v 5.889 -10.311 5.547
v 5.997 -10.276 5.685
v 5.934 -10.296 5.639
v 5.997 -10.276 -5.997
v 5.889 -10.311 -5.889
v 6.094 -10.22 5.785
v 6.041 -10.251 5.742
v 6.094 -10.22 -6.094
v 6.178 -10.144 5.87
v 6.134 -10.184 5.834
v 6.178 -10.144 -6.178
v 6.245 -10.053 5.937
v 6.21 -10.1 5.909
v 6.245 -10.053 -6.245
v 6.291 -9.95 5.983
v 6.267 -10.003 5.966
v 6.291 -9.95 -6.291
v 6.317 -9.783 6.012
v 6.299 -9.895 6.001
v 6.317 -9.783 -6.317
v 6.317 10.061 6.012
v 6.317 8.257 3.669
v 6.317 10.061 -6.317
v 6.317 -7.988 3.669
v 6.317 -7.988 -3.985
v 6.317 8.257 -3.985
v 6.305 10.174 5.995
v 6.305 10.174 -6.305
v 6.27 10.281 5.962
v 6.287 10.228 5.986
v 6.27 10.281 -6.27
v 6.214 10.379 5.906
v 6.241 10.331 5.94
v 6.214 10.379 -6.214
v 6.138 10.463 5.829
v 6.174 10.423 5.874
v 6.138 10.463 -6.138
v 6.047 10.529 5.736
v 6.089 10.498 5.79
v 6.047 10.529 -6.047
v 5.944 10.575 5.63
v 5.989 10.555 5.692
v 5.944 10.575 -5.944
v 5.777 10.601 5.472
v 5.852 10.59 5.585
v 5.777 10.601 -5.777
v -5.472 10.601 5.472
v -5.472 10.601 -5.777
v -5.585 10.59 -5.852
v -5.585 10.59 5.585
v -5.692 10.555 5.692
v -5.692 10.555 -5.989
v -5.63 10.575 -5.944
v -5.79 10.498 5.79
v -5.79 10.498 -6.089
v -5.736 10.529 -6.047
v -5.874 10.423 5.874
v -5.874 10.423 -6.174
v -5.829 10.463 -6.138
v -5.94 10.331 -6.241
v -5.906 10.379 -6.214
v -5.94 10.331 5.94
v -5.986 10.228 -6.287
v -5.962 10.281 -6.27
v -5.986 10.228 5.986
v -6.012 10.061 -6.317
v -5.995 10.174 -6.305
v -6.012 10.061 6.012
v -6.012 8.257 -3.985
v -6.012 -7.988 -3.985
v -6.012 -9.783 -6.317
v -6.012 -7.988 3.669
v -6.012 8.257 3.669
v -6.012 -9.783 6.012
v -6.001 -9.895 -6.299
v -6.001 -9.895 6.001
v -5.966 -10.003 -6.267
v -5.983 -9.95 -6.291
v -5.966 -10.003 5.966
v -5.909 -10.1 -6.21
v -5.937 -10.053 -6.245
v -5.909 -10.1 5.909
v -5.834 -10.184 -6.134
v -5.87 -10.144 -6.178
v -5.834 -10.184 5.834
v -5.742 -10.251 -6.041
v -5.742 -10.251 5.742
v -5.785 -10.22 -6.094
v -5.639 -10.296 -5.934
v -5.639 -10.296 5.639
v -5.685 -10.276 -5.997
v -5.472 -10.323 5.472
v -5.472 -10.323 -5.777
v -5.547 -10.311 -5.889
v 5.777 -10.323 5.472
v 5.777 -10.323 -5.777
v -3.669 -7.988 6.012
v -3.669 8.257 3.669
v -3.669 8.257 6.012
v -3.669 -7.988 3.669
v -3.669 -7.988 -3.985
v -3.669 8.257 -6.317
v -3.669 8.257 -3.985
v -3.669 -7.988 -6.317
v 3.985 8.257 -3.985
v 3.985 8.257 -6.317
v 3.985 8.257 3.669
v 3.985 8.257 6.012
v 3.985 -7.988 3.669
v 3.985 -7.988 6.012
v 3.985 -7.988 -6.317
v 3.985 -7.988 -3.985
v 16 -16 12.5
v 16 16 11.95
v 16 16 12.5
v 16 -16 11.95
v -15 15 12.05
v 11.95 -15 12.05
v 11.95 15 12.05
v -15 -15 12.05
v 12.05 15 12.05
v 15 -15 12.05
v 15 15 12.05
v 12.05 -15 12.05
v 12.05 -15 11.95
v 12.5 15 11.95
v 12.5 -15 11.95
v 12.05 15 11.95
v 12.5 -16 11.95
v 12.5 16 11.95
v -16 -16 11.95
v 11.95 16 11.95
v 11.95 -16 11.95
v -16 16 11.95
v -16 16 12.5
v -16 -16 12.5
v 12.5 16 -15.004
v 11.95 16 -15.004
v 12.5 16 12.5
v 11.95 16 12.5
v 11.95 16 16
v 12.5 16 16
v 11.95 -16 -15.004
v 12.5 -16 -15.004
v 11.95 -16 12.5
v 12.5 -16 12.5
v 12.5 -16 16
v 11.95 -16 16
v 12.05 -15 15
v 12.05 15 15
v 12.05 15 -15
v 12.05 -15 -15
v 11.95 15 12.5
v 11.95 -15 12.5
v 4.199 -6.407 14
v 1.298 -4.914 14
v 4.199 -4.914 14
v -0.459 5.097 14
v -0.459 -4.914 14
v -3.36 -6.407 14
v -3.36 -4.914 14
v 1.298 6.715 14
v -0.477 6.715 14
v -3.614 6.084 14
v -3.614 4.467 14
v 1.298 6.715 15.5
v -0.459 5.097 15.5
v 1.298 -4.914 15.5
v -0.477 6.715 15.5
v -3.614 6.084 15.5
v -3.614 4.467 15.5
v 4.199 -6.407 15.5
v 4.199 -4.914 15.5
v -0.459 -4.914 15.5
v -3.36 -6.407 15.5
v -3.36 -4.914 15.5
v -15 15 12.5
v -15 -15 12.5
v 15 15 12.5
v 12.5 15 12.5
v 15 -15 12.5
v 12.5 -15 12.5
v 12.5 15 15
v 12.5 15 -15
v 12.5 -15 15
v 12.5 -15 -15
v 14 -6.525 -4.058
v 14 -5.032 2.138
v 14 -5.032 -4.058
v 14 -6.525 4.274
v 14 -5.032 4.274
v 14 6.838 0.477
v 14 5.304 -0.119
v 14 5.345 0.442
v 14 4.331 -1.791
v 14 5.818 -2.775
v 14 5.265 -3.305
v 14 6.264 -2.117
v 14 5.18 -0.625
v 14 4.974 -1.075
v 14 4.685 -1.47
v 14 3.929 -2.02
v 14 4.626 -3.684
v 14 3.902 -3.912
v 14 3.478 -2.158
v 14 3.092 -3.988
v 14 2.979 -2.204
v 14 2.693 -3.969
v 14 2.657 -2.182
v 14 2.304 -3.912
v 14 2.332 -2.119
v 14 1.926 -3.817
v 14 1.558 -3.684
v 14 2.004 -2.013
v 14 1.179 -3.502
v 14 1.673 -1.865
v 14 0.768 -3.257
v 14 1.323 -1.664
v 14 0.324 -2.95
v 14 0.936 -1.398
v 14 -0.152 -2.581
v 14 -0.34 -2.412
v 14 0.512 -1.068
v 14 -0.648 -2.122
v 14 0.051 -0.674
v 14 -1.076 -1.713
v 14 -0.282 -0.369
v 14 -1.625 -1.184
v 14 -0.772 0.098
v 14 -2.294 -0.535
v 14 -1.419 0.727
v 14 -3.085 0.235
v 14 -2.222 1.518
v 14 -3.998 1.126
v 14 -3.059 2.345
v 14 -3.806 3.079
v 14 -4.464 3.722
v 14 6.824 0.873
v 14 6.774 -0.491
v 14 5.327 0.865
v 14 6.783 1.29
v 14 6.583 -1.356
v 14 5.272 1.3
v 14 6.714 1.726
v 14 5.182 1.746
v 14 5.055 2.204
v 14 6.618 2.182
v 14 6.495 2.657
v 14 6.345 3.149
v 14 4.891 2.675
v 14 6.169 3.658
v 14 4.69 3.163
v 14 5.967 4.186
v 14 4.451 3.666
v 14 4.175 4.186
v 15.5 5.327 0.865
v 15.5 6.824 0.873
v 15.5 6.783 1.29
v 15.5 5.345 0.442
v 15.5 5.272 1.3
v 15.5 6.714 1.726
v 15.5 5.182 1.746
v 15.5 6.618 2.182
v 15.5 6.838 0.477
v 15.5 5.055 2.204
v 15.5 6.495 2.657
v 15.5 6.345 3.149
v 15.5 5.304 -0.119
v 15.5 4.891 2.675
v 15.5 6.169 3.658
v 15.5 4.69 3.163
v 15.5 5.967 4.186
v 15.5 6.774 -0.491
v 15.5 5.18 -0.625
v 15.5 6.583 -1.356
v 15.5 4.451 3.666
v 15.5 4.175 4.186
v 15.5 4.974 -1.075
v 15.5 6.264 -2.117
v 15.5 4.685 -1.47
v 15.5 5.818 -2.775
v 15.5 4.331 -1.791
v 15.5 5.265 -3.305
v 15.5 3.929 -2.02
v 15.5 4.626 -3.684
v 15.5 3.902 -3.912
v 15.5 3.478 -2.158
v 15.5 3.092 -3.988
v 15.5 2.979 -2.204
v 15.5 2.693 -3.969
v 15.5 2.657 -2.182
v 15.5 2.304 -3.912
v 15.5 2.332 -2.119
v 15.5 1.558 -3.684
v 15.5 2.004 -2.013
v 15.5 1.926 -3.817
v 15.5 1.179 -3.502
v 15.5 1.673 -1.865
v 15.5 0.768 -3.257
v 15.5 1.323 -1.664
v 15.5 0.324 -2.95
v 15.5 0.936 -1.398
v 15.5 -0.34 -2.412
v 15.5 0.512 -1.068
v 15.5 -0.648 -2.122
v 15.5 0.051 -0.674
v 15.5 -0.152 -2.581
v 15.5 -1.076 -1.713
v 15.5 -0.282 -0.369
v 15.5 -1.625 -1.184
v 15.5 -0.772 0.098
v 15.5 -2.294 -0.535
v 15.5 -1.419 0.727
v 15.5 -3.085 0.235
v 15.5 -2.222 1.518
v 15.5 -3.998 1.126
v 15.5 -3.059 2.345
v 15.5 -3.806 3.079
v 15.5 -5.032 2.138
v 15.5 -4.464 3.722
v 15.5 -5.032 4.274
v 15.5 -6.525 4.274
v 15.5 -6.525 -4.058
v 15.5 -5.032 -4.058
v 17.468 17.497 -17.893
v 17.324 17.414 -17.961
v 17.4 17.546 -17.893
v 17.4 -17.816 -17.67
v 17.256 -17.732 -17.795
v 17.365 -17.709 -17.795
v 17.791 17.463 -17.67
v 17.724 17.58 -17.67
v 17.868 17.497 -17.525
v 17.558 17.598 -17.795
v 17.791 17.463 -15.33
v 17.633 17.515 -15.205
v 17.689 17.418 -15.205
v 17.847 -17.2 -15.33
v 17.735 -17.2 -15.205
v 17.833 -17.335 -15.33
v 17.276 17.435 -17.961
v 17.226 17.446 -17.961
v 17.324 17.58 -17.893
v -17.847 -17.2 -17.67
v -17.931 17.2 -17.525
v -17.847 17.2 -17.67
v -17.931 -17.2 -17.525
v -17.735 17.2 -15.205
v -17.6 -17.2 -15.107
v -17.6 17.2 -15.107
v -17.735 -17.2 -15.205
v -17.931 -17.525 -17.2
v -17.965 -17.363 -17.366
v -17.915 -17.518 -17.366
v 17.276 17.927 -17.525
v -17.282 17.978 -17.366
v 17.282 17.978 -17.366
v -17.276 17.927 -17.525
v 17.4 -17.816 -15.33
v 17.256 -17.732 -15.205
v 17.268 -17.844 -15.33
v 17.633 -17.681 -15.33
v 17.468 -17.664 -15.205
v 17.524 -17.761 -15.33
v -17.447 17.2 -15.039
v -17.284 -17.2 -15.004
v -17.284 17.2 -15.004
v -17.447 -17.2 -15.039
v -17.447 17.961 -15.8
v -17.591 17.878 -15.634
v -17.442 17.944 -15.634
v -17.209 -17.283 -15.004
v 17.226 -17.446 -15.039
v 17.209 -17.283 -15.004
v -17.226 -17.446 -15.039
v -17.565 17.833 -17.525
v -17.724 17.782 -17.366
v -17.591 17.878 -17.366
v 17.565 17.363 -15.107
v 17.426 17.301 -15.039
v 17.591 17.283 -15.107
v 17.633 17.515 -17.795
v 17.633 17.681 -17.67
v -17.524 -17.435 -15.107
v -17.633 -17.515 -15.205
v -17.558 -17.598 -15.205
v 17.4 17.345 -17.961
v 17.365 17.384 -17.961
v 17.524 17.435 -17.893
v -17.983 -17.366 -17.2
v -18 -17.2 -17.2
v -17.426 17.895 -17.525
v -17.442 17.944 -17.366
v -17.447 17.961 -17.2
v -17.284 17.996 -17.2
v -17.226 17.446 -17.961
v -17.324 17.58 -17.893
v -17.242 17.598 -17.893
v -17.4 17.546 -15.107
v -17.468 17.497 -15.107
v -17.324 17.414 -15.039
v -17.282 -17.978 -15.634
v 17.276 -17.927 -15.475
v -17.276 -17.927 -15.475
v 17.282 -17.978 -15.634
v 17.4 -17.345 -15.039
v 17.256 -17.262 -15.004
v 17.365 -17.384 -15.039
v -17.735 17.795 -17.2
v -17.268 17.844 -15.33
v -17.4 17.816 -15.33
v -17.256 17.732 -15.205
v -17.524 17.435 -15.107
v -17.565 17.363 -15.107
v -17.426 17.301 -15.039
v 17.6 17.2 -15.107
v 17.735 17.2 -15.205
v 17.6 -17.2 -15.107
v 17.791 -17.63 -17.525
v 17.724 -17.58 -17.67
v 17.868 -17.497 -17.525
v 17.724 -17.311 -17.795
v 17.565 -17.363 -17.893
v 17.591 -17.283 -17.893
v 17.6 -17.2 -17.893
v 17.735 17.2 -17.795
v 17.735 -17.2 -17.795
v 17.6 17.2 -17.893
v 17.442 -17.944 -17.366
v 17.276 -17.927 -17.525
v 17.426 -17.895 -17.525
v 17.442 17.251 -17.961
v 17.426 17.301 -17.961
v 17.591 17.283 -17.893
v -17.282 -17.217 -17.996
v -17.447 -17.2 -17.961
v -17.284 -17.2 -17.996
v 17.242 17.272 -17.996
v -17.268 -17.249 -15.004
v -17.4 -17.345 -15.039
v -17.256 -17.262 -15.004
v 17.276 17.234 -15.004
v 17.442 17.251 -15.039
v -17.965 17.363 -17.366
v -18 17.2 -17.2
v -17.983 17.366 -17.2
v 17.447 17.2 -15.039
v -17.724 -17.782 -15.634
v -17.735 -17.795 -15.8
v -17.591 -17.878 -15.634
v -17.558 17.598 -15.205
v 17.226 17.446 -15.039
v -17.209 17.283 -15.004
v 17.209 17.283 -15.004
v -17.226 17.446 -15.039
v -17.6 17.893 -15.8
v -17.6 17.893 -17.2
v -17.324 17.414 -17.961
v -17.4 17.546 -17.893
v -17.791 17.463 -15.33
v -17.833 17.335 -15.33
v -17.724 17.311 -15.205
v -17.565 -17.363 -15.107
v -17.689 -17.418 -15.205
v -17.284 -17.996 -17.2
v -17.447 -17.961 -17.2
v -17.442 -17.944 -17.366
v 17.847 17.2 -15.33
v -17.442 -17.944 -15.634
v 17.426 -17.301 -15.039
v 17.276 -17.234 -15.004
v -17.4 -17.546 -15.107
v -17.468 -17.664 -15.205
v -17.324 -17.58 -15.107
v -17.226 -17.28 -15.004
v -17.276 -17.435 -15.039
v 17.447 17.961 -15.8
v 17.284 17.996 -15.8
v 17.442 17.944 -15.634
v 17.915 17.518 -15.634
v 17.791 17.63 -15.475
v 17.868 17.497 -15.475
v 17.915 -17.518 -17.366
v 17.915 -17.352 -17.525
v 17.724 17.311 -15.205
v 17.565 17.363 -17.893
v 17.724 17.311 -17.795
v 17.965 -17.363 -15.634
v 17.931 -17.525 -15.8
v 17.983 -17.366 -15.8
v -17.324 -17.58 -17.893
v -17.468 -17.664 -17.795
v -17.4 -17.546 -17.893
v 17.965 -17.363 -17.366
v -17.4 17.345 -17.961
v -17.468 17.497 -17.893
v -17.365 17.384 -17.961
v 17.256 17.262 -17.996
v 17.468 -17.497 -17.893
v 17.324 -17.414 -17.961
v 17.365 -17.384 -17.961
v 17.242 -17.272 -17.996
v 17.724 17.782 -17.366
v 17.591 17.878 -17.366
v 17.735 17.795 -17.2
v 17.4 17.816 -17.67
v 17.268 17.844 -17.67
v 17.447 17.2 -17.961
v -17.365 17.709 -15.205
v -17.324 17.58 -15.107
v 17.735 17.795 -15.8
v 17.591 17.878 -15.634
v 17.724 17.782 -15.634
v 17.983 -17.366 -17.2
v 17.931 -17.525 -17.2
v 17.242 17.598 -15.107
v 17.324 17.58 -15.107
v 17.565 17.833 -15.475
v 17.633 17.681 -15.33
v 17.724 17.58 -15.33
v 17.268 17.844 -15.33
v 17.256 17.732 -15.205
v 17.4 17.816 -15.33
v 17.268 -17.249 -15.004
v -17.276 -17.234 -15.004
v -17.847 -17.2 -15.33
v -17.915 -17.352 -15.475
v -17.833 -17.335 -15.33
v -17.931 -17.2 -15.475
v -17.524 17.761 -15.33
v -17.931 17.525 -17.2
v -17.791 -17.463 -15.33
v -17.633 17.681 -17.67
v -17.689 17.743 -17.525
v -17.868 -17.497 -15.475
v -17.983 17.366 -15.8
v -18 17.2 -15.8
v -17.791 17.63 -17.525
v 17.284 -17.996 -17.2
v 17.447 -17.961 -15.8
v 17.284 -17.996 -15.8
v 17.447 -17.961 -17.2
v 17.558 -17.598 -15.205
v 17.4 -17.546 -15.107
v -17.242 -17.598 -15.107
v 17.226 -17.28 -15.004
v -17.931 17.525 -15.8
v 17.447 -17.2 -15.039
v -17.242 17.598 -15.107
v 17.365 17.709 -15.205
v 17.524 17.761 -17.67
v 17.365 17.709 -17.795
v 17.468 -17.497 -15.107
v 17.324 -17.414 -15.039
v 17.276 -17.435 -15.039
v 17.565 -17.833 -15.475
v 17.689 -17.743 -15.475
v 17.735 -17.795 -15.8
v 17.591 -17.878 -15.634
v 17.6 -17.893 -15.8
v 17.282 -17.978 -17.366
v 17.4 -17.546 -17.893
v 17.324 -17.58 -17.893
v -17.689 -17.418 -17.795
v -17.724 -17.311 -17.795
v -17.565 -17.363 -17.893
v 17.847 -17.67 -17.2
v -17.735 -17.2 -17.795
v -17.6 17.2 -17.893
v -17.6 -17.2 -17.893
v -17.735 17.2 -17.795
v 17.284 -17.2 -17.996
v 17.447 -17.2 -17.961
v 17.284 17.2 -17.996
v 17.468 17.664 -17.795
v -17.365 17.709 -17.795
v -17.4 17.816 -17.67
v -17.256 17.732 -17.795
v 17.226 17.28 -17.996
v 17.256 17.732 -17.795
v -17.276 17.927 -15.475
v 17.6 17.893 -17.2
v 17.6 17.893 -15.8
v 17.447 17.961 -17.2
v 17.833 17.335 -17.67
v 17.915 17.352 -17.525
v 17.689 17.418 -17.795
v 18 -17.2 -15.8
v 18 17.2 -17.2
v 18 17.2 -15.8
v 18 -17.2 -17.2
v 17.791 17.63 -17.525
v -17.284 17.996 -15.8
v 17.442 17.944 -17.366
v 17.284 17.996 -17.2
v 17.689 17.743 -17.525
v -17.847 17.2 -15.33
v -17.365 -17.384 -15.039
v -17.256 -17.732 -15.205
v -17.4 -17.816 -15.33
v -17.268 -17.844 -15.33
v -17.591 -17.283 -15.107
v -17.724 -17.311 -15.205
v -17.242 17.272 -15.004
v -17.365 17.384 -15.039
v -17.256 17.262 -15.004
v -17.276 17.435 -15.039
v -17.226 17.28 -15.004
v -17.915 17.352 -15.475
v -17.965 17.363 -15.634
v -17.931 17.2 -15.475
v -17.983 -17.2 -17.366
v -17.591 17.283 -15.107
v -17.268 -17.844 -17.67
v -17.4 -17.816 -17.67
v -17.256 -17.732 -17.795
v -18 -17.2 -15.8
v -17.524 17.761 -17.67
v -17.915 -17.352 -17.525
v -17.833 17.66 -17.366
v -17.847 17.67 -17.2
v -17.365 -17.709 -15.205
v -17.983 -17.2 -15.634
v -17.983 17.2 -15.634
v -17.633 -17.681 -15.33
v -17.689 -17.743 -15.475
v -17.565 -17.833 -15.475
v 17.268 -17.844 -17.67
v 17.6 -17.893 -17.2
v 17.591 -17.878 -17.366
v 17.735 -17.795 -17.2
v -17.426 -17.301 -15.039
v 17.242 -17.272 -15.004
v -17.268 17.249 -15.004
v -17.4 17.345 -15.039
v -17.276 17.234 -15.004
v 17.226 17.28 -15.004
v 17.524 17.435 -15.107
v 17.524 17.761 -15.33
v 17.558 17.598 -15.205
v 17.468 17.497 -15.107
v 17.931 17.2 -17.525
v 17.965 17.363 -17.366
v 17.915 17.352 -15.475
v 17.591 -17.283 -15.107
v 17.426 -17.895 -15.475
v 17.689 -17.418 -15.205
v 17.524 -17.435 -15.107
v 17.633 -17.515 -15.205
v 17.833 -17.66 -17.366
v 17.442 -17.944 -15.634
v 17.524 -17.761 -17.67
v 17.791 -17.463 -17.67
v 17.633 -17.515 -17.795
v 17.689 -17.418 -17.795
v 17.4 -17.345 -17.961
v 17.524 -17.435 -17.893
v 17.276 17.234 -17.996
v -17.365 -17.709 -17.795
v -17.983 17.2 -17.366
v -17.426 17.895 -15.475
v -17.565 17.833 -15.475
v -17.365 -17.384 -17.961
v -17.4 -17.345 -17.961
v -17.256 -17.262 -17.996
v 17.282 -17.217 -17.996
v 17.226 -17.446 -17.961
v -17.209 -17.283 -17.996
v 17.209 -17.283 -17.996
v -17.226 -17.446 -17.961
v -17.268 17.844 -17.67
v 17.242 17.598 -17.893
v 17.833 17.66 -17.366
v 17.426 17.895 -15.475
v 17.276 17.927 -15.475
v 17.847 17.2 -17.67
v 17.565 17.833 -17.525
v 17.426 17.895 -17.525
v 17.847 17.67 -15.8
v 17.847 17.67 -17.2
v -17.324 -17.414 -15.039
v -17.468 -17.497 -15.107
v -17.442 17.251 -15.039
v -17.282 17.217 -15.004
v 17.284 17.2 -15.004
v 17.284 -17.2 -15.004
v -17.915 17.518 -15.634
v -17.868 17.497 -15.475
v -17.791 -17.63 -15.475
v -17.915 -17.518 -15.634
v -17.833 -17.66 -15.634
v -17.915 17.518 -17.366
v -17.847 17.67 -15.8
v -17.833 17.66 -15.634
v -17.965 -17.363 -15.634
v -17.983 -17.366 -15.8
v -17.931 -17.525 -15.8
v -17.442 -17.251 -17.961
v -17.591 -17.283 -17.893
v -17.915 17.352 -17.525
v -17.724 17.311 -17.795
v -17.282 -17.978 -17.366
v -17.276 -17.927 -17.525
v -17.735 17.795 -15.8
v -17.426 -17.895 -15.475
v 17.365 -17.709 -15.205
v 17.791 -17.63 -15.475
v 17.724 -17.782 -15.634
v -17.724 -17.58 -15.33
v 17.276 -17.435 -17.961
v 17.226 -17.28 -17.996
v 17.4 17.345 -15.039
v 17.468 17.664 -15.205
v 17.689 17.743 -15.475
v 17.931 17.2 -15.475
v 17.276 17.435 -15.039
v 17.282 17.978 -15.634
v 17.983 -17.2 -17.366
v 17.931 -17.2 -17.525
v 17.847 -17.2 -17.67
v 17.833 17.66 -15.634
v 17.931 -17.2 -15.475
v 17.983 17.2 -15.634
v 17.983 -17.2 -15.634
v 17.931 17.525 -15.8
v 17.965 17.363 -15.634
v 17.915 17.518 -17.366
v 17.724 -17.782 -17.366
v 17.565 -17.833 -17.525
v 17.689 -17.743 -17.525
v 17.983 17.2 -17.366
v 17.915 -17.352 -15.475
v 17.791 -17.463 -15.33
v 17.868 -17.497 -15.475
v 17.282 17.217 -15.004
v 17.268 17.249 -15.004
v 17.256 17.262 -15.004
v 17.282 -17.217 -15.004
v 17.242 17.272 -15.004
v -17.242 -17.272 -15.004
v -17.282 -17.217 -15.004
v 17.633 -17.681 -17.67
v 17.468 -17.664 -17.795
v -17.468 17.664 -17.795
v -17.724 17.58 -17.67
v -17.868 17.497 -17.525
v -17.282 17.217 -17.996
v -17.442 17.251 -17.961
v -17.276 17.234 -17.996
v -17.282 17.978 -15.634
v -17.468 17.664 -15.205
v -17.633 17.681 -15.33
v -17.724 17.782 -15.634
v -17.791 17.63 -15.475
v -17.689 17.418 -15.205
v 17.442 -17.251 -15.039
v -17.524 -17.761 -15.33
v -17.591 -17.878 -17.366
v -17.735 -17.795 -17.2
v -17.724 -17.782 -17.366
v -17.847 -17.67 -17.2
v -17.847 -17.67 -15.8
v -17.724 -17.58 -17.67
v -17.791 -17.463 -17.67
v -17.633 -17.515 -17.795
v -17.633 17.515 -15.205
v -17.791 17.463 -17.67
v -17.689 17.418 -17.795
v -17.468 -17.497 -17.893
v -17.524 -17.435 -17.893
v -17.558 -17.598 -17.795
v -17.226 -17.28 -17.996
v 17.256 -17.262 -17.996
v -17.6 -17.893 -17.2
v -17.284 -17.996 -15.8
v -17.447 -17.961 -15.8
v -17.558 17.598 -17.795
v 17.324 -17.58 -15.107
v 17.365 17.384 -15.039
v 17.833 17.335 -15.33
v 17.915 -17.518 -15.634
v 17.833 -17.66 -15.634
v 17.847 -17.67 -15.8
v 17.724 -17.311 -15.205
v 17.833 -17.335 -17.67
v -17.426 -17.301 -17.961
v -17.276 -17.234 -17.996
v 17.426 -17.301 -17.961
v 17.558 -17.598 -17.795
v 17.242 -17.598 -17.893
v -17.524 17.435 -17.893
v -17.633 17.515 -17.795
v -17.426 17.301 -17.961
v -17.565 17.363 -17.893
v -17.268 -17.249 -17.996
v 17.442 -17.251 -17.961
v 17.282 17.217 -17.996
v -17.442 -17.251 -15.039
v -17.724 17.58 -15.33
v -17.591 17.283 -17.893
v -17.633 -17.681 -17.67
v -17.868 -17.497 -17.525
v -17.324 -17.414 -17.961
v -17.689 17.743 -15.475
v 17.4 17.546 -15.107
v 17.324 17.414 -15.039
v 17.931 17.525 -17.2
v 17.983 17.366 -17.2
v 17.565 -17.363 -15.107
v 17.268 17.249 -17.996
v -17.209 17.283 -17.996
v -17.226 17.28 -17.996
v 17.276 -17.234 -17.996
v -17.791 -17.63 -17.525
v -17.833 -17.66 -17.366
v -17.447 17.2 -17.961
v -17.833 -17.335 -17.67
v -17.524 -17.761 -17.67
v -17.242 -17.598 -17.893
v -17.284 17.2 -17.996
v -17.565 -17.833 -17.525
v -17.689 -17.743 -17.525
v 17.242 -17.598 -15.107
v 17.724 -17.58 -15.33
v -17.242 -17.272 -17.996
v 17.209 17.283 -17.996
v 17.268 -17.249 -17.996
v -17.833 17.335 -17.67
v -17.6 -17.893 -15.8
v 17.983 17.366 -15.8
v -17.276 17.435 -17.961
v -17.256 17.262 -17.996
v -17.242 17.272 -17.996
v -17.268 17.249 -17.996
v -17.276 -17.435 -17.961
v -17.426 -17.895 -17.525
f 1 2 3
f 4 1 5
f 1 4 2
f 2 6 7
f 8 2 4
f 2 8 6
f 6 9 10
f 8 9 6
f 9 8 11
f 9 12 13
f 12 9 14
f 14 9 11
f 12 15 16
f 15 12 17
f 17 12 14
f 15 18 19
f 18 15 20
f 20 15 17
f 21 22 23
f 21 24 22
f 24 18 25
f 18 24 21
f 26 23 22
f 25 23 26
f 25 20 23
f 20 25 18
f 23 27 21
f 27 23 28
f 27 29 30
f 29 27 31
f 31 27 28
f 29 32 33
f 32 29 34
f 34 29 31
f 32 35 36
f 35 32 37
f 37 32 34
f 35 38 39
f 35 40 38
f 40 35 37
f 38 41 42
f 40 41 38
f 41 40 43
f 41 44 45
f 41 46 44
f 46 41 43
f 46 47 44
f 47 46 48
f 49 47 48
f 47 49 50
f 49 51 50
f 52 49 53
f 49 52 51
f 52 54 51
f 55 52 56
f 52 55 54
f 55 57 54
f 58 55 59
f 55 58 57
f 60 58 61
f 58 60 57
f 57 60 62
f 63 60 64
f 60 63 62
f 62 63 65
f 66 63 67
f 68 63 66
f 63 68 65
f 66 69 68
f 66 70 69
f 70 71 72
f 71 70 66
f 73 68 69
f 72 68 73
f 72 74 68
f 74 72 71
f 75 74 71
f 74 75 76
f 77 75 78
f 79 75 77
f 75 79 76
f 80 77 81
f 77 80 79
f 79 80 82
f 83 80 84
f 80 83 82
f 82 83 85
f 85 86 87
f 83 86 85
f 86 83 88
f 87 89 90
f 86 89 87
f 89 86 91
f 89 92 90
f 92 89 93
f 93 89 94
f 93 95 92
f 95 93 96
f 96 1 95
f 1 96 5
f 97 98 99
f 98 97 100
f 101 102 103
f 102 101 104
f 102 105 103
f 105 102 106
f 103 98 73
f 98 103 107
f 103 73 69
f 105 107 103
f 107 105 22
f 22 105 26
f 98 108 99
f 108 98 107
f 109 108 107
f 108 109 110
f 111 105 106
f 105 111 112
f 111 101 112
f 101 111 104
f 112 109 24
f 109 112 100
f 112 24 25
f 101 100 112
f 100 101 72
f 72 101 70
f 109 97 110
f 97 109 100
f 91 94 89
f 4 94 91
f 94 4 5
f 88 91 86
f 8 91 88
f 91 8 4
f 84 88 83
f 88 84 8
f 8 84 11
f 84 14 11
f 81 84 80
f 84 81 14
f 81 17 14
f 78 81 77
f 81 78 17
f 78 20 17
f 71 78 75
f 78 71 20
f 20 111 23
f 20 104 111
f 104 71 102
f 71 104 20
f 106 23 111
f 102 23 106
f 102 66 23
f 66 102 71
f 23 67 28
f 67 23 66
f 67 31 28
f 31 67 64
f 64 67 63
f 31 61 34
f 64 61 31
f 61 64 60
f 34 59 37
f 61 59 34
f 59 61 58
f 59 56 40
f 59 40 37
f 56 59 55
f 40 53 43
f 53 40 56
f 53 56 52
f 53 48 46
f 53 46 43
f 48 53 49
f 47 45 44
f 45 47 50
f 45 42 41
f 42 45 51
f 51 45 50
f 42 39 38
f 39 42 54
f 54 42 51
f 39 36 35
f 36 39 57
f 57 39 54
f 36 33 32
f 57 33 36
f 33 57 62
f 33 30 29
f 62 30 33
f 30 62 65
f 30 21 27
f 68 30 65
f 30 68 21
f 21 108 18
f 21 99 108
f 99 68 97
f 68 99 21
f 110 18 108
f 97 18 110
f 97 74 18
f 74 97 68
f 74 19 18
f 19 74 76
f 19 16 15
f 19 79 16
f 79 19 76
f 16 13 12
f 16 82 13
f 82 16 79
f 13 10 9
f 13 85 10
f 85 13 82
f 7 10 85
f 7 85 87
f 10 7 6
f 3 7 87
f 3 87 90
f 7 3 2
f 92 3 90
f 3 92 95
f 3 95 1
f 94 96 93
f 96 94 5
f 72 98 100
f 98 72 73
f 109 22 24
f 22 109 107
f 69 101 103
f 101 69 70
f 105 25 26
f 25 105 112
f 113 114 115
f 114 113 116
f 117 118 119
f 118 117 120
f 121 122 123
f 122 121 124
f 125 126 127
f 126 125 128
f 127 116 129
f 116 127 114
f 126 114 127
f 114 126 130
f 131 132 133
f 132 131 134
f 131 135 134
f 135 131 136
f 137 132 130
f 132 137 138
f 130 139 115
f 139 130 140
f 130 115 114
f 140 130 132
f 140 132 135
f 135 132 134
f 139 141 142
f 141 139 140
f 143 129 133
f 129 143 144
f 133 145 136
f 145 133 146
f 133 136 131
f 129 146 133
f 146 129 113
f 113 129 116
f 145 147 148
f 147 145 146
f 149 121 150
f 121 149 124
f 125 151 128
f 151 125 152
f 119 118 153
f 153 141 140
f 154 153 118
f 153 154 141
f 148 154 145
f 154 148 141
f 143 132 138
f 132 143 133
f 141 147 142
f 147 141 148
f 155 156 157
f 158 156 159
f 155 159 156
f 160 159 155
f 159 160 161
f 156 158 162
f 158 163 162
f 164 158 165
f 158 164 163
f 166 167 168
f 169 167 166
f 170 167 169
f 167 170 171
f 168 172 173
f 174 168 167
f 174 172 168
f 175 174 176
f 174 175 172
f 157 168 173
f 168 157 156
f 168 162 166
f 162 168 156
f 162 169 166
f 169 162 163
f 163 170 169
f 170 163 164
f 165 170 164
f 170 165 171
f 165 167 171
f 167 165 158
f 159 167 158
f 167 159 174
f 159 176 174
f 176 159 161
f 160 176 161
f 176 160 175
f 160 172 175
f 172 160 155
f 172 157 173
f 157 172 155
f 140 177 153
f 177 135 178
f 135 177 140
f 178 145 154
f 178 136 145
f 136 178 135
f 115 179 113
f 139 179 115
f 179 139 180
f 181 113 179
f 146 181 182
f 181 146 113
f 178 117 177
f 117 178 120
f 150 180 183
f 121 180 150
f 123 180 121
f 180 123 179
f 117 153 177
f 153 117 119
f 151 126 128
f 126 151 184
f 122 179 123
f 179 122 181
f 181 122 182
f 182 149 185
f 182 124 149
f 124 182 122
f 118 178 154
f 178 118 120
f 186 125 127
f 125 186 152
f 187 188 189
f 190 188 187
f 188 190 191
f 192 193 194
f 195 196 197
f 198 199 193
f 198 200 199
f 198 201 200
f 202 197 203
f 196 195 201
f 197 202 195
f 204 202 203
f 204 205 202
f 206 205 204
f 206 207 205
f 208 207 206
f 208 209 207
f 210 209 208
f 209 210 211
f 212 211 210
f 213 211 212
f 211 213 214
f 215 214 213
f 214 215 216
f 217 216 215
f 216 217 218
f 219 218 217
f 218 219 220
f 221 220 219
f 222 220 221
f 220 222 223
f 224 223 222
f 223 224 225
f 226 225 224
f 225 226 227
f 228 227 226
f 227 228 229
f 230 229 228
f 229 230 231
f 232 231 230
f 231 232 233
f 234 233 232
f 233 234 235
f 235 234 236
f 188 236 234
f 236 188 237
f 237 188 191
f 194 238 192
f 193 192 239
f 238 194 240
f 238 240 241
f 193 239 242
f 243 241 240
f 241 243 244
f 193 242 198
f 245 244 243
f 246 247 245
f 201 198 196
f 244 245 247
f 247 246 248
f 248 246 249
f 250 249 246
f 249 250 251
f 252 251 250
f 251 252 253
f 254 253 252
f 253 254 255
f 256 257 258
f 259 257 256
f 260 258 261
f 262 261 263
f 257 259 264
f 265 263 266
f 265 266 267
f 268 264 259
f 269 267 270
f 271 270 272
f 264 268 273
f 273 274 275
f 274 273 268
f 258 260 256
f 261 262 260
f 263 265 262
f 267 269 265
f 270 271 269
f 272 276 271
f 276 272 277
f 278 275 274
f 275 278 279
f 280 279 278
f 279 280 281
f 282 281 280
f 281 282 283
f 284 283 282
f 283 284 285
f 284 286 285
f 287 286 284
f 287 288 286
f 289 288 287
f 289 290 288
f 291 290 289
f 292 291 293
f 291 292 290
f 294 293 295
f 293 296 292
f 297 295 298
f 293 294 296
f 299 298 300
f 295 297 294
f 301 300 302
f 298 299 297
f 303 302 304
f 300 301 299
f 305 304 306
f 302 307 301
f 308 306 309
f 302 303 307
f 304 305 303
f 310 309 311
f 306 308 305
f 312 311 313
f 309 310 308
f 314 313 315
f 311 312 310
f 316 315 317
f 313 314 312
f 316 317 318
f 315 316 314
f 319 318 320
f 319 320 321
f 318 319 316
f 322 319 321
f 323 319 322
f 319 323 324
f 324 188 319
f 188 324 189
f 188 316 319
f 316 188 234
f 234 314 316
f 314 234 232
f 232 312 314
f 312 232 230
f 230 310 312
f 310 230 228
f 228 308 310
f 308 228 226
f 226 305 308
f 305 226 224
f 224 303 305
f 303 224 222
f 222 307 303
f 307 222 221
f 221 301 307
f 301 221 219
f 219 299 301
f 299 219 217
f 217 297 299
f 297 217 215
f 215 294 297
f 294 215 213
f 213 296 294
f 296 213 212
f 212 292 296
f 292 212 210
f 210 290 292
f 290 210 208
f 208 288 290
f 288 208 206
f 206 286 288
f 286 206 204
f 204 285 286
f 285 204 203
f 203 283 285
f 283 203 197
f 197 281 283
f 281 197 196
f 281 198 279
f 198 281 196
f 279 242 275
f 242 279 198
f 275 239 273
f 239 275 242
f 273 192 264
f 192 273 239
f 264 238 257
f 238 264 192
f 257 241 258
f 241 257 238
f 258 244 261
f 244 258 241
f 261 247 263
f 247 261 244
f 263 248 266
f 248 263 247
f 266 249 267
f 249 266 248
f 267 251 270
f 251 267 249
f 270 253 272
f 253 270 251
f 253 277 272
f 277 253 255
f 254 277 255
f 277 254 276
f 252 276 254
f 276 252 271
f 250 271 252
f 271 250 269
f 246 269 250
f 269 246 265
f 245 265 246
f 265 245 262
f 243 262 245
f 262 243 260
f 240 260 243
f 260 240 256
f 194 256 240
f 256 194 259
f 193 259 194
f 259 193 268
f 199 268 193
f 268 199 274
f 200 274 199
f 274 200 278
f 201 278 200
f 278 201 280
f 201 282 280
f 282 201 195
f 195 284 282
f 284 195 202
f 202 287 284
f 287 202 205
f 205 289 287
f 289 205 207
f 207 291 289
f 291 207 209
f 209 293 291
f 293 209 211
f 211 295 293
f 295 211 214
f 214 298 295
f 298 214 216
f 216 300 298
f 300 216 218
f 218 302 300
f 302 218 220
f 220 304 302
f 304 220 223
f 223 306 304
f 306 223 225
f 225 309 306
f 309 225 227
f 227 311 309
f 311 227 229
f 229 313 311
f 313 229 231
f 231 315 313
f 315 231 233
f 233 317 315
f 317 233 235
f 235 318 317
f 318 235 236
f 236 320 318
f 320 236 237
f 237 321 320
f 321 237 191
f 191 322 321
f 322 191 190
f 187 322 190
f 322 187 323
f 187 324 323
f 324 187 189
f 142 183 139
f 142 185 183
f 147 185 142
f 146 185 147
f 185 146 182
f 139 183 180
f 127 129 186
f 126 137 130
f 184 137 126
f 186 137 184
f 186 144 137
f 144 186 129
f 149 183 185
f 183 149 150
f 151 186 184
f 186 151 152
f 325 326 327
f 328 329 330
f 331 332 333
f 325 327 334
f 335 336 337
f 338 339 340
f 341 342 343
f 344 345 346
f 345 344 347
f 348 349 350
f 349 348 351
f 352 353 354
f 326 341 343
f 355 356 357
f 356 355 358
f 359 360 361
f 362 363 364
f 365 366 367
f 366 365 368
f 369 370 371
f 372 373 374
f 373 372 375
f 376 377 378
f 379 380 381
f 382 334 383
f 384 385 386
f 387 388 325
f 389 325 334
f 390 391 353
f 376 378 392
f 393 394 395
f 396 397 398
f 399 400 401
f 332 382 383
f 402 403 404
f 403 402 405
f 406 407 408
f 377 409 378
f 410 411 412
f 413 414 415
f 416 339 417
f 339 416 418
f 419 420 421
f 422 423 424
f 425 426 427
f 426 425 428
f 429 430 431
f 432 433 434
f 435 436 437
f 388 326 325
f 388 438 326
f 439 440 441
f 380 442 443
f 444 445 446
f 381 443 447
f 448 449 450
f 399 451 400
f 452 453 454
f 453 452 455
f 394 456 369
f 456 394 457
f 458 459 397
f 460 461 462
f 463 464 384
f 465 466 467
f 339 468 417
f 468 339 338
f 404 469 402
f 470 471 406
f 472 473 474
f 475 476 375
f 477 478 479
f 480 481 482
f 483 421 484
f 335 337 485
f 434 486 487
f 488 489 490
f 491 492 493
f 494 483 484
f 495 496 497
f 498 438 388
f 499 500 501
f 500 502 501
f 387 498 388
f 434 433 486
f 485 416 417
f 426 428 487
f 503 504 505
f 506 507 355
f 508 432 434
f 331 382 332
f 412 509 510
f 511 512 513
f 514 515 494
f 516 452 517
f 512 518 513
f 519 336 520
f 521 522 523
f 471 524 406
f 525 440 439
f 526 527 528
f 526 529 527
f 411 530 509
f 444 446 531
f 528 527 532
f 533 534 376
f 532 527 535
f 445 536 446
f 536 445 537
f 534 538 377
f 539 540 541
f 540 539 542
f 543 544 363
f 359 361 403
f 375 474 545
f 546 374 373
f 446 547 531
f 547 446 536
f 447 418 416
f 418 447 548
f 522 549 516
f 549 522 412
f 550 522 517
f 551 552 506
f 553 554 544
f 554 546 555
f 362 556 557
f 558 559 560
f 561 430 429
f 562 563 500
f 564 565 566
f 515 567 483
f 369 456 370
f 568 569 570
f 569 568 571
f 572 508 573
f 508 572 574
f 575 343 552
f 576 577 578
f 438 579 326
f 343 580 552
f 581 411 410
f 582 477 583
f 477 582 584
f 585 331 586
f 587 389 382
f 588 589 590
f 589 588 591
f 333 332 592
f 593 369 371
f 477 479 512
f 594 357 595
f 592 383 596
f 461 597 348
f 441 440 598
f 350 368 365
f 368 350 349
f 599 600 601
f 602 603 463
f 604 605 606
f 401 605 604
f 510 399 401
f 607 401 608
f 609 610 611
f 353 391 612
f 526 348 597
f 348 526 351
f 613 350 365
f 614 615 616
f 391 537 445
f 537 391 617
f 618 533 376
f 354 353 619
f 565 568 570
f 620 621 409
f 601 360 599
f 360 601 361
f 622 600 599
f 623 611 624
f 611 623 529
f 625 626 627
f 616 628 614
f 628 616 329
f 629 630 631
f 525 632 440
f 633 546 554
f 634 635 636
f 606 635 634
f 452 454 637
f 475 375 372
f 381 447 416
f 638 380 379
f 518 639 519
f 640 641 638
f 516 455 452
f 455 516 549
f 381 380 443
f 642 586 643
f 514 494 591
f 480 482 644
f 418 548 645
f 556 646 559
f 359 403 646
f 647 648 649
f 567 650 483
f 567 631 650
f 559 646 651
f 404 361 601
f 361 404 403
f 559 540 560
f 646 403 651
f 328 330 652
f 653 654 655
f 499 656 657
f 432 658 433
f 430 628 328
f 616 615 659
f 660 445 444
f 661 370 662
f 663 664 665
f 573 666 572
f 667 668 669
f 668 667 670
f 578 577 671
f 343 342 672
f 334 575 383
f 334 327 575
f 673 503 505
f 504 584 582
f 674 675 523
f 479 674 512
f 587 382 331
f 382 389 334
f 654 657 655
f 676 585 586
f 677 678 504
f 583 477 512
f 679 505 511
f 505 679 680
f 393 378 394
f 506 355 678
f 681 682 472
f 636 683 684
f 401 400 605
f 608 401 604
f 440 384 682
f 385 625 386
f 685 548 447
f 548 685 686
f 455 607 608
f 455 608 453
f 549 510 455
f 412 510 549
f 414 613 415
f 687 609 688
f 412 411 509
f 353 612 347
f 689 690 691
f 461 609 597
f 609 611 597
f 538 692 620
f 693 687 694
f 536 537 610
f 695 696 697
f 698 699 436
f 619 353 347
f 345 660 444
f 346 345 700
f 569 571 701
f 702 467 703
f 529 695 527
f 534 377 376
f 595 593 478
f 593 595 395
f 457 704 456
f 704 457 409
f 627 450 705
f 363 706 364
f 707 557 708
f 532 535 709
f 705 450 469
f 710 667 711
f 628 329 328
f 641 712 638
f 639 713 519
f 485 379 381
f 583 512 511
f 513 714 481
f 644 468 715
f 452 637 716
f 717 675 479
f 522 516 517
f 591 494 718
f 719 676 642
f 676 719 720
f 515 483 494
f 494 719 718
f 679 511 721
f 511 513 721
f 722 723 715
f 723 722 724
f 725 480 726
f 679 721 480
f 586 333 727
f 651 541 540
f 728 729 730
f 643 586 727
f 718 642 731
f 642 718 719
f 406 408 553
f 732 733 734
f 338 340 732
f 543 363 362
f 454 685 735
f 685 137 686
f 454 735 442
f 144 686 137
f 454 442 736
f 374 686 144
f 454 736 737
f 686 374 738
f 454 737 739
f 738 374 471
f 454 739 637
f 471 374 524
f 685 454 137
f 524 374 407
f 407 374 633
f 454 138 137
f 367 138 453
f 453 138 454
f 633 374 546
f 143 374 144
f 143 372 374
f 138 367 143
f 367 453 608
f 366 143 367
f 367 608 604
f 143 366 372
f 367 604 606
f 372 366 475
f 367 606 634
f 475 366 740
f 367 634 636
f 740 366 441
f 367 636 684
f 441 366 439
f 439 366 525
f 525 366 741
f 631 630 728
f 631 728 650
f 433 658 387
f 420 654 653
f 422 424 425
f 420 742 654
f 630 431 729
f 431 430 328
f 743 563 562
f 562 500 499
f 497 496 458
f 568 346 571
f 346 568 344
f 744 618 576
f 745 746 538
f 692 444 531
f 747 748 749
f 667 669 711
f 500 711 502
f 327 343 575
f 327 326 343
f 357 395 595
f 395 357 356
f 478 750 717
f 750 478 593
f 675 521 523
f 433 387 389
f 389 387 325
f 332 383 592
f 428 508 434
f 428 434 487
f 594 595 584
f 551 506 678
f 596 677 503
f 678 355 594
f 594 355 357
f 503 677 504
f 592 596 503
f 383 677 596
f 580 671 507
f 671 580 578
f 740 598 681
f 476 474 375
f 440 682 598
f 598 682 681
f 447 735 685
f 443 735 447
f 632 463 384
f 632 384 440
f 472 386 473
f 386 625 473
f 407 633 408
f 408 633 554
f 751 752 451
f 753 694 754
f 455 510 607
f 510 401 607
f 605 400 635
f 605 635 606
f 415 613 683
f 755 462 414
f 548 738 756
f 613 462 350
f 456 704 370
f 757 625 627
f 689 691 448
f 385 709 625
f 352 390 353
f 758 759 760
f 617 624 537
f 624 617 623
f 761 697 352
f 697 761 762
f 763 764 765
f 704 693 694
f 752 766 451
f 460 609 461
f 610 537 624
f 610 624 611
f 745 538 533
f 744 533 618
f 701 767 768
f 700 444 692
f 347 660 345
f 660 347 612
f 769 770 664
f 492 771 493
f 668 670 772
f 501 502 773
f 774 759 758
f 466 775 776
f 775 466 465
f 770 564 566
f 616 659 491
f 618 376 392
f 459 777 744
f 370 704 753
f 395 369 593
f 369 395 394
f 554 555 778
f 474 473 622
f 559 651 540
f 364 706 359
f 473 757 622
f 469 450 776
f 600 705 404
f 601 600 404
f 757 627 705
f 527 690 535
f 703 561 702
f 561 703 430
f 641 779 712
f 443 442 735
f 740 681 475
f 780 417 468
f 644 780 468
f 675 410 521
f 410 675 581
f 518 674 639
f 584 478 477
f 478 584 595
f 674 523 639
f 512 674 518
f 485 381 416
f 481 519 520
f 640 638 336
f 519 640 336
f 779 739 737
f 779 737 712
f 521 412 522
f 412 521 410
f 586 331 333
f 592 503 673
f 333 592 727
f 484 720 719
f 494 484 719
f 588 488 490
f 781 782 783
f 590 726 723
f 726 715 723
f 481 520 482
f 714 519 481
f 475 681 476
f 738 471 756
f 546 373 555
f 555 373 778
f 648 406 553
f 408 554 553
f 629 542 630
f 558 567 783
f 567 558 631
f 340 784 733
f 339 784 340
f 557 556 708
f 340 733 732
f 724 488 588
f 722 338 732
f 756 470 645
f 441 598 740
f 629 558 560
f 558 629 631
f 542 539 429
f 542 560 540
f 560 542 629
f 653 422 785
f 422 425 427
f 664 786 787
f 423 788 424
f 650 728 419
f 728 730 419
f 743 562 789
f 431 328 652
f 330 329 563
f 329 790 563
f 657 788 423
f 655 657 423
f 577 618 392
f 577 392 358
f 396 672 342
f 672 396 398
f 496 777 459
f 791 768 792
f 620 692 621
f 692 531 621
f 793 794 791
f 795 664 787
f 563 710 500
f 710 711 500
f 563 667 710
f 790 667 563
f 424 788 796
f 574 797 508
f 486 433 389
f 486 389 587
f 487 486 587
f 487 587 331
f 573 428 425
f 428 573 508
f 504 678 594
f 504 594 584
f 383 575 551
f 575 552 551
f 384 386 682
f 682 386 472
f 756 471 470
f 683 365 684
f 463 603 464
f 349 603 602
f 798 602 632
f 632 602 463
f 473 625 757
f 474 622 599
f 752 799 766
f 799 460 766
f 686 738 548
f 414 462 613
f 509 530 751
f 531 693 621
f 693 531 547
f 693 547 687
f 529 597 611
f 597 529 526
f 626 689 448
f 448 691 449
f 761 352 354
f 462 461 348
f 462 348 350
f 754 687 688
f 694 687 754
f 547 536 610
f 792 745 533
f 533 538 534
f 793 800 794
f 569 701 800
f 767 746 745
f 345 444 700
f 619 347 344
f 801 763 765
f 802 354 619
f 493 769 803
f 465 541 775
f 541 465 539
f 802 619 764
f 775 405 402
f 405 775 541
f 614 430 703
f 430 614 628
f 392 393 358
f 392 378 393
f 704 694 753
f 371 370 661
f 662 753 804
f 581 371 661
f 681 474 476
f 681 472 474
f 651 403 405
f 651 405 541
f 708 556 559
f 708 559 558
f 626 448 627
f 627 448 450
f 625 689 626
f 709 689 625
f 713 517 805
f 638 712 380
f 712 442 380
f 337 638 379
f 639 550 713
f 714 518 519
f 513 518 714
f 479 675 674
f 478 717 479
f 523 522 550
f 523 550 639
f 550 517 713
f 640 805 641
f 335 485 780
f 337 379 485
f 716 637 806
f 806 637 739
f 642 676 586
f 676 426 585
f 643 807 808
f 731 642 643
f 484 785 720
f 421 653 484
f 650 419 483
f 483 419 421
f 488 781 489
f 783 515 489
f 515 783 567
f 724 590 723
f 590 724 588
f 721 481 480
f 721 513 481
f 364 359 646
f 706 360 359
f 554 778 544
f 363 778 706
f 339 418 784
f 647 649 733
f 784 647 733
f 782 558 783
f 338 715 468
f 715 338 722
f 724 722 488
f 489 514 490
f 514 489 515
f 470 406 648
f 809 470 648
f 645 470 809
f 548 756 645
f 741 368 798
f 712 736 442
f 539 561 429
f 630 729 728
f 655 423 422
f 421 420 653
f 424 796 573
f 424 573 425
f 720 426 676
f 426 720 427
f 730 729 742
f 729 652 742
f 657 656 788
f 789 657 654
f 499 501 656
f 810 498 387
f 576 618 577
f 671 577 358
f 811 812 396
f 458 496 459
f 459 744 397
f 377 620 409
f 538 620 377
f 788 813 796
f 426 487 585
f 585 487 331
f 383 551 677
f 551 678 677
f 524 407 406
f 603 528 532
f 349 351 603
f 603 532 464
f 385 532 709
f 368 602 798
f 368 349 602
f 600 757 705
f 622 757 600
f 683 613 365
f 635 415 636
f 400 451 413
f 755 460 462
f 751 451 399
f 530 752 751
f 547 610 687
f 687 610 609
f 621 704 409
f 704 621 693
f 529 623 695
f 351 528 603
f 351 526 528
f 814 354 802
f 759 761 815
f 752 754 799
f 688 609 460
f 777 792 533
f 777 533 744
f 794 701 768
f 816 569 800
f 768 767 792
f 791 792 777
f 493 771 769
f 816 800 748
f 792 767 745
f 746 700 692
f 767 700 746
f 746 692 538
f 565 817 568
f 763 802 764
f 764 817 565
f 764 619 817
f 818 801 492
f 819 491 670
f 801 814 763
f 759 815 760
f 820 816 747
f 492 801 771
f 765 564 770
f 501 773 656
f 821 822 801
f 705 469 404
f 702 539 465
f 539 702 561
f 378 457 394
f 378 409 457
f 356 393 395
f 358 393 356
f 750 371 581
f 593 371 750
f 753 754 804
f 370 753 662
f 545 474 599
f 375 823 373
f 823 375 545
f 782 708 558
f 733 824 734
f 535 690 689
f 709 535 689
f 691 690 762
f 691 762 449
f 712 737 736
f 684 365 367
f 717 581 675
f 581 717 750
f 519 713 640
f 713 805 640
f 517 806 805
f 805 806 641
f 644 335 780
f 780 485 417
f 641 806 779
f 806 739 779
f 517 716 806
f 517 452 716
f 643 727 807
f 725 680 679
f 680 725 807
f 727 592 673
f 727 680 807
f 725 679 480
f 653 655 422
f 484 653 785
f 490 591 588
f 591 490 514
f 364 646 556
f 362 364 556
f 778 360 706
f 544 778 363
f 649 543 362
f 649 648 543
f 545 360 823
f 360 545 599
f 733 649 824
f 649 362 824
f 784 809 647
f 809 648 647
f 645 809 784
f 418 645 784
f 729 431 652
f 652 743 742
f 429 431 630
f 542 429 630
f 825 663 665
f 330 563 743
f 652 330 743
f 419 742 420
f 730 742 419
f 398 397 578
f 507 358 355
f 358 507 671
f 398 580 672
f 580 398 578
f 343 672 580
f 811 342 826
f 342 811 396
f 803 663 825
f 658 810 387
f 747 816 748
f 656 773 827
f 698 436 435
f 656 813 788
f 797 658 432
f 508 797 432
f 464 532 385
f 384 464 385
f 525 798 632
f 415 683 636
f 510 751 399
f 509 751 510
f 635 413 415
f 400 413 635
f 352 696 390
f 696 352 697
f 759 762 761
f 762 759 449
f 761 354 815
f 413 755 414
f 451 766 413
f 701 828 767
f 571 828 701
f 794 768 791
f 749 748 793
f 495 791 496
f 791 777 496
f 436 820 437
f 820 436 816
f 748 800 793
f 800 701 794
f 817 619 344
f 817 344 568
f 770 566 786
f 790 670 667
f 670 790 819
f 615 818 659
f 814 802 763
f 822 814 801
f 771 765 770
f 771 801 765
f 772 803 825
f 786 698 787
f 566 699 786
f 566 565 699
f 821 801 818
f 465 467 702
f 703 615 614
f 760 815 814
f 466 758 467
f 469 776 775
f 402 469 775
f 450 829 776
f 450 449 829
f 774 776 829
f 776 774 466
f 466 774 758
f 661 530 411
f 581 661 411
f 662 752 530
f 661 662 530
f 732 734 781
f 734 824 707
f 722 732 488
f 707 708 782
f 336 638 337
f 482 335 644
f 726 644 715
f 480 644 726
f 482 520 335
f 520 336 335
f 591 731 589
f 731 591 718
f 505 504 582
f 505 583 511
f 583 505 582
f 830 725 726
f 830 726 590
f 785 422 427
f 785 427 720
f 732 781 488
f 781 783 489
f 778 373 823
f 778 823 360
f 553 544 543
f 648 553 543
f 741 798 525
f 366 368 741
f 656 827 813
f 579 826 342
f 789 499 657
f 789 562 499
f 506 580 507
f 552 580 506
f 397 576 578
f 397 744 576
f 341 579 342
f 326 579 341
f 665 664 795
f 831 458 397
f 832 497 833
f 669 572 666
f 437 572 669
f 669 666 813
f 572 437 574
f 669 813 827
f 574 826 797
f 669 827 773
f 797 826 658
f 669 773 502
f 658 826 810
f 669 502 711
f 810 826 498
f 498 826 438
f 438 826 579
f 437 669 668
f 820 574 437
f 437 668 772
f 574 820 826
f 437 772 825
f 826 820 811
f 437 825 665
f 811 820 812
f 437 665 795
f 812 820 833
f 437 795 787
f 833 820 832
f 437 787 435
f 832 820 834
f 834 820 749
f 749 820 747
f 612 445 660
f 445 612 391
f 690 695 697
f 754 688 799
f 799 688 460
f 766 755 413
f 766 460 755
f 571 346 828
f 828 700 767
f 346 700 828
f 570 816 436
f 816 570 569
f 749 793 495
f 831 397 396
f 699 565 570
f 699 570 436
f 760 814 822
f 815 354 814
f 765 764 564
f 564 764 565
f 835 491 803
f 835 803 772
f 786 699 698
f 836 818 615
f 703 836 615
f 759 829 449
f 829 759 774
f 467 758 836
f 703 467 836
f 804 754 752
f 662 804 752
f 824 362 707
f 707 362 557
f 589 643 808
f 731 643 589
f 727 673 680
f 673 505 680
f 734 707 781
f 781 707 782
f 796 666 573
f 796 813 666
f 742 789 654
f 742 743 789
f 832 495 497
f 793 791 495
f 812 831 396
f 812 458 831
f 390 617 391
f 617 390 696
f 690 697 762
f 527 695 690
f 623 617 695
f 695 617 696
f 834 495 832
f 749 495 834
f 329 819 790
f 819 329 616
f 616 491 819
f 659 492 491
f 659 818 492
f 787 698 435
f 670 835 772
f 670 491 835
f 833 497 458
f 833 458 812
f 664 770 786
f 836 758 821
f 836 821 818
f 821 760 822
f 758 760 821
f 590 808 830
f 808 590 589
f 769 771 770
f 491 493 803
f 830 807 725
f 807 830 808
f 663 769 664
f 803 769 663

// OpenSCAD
// 多方向立体汉字 - 全新切割方法
$fn = 30; // 平滑度

/* [字体设置] */
// 正面汉字
char_front = "中";
// 侧面汉字
char_side = "国";
// 字体
font = "华文楷体";
// 字体大小
char_size = 18;

/* [旋转与位置] */
// 正面字X轴旋转角度
front_x_angle = 0;
// 正面字Y轴旋转角度
front_y_angle = 0;
// 正面字Z轴旋转角度
front_z_angle = 0;
// 侧面字X轴旋转角度
side_x_angle = 0;
// 侧面字Y轴旋转角度
side_y_angle = 90;
// 侧面字Z轴旋转角度
side_z_angle = 0;

/* [模型参数] */
// 挤出深度
extrude_depth = 30;
// 壁厚
wall_thickness = 2.5;
// 立方体大小
cube_size = 40;
// 笔画连接偏移量(mm)
stroke_offset = 0.6;
// 显示模式：0=交合部分，1=完整模型
show_mode = 0;

/* [参照面设置] */
// 是否显示参照面
show_reference_faces = true;
// 面标识模式：0=无标识，1=显示面编号，2=显示面颜色
face_identification = 1;
// 面标识大小 (相对于字体大小的比例)
face_id_size_ratio = 0.6;
// 面标识位置偏移 (mm)
face_id_offset = 2;
// 面标识颜色
front_face_color = "red";
side_face_color = "green";
// 面标识线宽 (mm)
face_id_line_width = 1.0;

/* [底座设置] */
// 是否添加底座
add_base = true;
// 底座形状：0=圆形，1=方形
base_shape = 1;
// 底座直径/边长 (相对于模型大小的比例)
base_size_ratio = 0.9;
// 底座高度
base_height = 3;
// 底座嵌入深度 (正值表示底座向上嵌入模型)
base_embed = 0;
// 底座倒角半径
base_fillet = 0.8;
// 底座X轴位置调整
base_x_offset = 0;
// 底座Y轴位置调整
base_y_offset = 0;
// 底座Z轴位置调整
base_z_offset = 0;
// 底座X轴旋转角度
base_x_rotation = 0;
// 底座Y轴旋转角度
base_y_rotation = 0;
// 底座Z轴旋转角度
base_z_rotation = 0;

// 计算底座实际尺寸
base_size = cube_size * base_size_ratio;

// 计算当前旋转角度数组
front_rotation = [front_x_angle, front_y_angle, front_z_angle];
side_rotation = [side_x_angle, side_y_angle, side_z_angle];

// 增强笔画连接的函数
module enhanced_text(char_text, size=char_size, font_name=font) {
    offset(r=stroke_offset) 
        text(char_text, size=size, font=font_name, halign="center", valign="center");
}

// 创建中空立体字
module hollow_3d_char(char_text) {
    difference() {
        linear_extrude(height=extrude_depth*0.8, center=true)
            enhanced_text(char_text);
        
        linear_extrude(height=extrude_depth*0.8+1, center=true)
            offset(delta=-wall_thickness)
                enhanced_text(char_text);
    }
}

// 基础多方向字体结构
module base_structure() {
    intersection() {
        union() {
            scale([0.9, 0.9, 0.9])
                rotate(front_rotation)
                hollow_3d_char(char_front);
            
            scale([0.9, 0.9, 0.9])
                rotate(side_rotation)
                    hollow_3d_char(char_side);
        }
        cube([cube_size*0.9, cube_size*0.9, cube_size*0.9], center=true);
    }
}

// 创建前面文字掩码
module front_text_mask() {
    translate([0, -cube_size*0.45, 0])
        rotate([90, 0, 0])
            linear_extrude(height=20)
                offset(r=5)
                    rotate([0, 0, 0])
                        enhanced_text(char_front);
}

// 创建侧面文字掩码
module side_text_mask() {
    translate([-cube_size*0.45, 0, 0])
        rotate([0, 90, 0])
            linear_extrude(height=20)
                offset(r=5)
                    rotate([0, 0, 0])
                        enhanced_text(char_side);
}

// 前面平板区域
module front_plate() {
    translate([0, -cube_size*0.45, 0])
        cube([cube_size, 20, cube_size], center=true);
}

// 侧面平板区域
module side_plate() {
    translate([-cube_size*0.45, 0, 0])
        cube([20, cube_size, cube_size], center=true);
}

// 创建切割后的最终模型
module final_model() {
    // 前面区域的处理
    intersection() {
        base_structure();
        
        // 只保留前面的文字部分
        union() {
            // 不是前面区域的部分保持原样
            difference() {
                cube([cube_size*2, cube_size*2, cube_size*2], center=true);
                front_plate();
            }
            
            // 前面的文字保留
            front_text_mask();
        }
    }
    
    // 侧面区域的处理
    intersection() {
        base_structure();
        
        // 只保留侧面的文字部分
        union() {
            // 不是侧面区域的部分保持原样
            difference() {
                cube([cube_size*2, cube_size*2, cube_size*2], center=true);
                side_plate();
            }
            
            // 侧面的文字保留
            side_text_mask();
        }
    }
}

// 只保留两个方向交合的部分
module intersection_only_model() {
    // 创建前面字的实体部分（不含边缘处理，仅用于求交）
    module front_char_solid() {
        translate([0, 0, 0])
            scale([0.9, 0.9, 0.9])
                rotate(front_rotation)
                linear_extrude(height=extrude_depth*0.8, center=true)
                    enhanced_text(char_front);
    }
    
    // 创建侧面字的实体部分（不含边缘处理，仅用于求交）
    module side_char_solid() {
        translate([0, 0, 0])
            scale([0.9, 0.9, 0.9])
                rotate(side_rotation)
                    linear_extrude(height=extrude_depth*0.8, center=true)
                        enhanced_text(char_side);
    }
    
    // 计算两个字的交集部分
    intersection() {
        front_char_solid();
        side_char_solid();
        
        // 限制在立方体范围内
        cube([cube_size*0.9, cube_size*0.9, cube_size*0.9], center=true);
    }
}

// 获取模型对象
module get_model() {
    if (show_mode == 0) {
        // 只显示交合部分
        intersection_only_model();
    } else {
        // 显示完整模型
        final_model();
    }
}

// 创建底座
module create_base() {
    // 底座位置计算 - 将底座定位在模型底部，并应用位置和旋转调整
    translate([base_x_offset, base_y_offset, -cube_size*0.45 + base_z_offset]) {
        rotate([base_x_rotation, base_y_rotation, base_z_rotation]) {
            if (base_shape == 0) {
                // 圆形底座
                difference() {
                    cylinder(h=base_height, d=base_size, center=false);
                    
                    // 倒角
                    if (base_fillet > 0) {
                        // 上边缘倒角
                        translate([0, 0, base_height - base_fillet]) {
                            rotate_extrude() {
                                translate([base_size/2 - base_fillet, 0, 0])
                                    circle(r=base_fillet);
                            }
                        }
                        
                        // 下边缘倒角
                        translate([0, 0, base_fillet]) {
                            rotate_extrude() {
                                translate([base_size/2 - base_fillet, 0, 0])
                                    circle(r=base_fillet);
                            }
                        }
                    }
                }
            } else {
                // 方形底座
                translate([0, 0, base_height/2]) {
                    minkowski() {
                        cube([base_size - 2*base_fillet, base_size - 2*base_fillet, base_height - 2*base_fillet], center=true);
                        sphere(r=base_fillet);
                    }
                }
            }
        }
    }
}

// 显示立方体参照面
module show_cube_faces() {
    if (show_reference_faces && face_identification > 0) {
        // 参照面根据字体旋转角度调整
        
        // 正面参照面（红色，对应1号）- 随前面字旋转
        color(front_face_color, 0.3)
            rotate(front_rotation)
            translate([0, 0, extrude_depth*0.4])
            cube([cube_size*0.8, cube_size*0.8, 0.1], center=true);
        
        // 侧面参照面（绿色，对应2号）- 随侧面字旋转
        color(side_face_color, 0.3)
            rotate(side_rotation)
            translate([0, 0, extrude_depth*0.4])
            cube([cube_size*0.8, cube_size*0.8, 0.1], center=true);
    }
}

// 创建面标识
module create_face_identifier(face_num, rotation, position, color_name) {
    if (show_reference_faces && face_identification > 0) {
        // 面编号标识
        if (face_identification == 1) {
            color("black")
            translate(position)
            rotate(rotation)
            linear_extrude(height=face_id_line_width)
                text(str(face_num), 
                    size=char_size*face_id_size_ratio, 
                    font="Arial", 
                    halign="center", 
                    valign="center");
        }
        // 面颜色标识
        else if (face_identification == 2) {
            color(color_name)
            translate(position)
            rotate(rotation)
            linear_extrude(height=face_id_line_width)
                circle(r=char_size*face_id_size_ratio);
        }
    }
}

// 创建面边框
module create_face_outline(position, rotation, color_name) {
    if (show_reference_faces && face_identification > 0) {
        color(color_name)
        translate(position)
        rotate(rotation)
        linear_extrude(height=face_id_line_width*0.5)
            difference() {
                square([cube_size*0.8, cube_size*0.8], center=true);
                square([cube_size*0.8-face_id_line_width*2, cube_size*0.8-face_id_line_width*2], center=true);
            }
    }
}

// 组合模型和底座
module combined_model() {
    // 渲染模型
    render(convexity=10)
        get_model();
    
    // 添加底座
    if (add_base) {
        render(convexity=10)
            create_base();
    }
    
    // 显示参照面
    show_cube_faces();
    
    // 添加面标识和边框
    if (show_reference_faces && face_identification > 0) {
        // 正面标识(1号) - 根据旋转角度调整
        color("black") 
        rotate(front_rotation)
        translate([0, 0, extrude_depth*0.4 + face_id_offset])
        linear_extrude(height=face_id_line_width*1.5)
            text("1", 
                size=char_size*face_id_size_ratio*1.2, 
                font="Arial Black", 
                halign="center", 
                valign="center");
        
        // 正面边框 - 随旋转角度变化
        rotate(front_rotation)
        create_face_outline([0, 0, extrude_depth*0.4], [0, 0, 0], front_face_color);
        
        // 侧面标识(2号) - 根据旋转角度调整
        color("black") 
        rotate(side_rotation)
        translate([0, 0, extrude_depth*0.4 + face_id_offset])
        rotate([0, 0, 0])
        scale([1, 1, 1]) // 可以根据需要调整缩放
        linear_extrude(height=face_id_line_width*1.5)
            text("2", 
                size=char_size*face_id_size_ratio*1.2, 
                font="Arial Black", 
                halign="center", 
                valign="center");
        
        // 侧面边框 - 随旋转角度变化
        rotate(side_rotation)
        create_face_outline([0, 0, extrude_depth*0.4], [0, 0, 0], side_face_color);
    }
}

// 渲染最终模型
combined_model();

// 输出模型信息
echo("多面字打印 - 两个字优化版");
echo(str("当前字体: 正面='", char_front, "', 侧面='", char_side, "'"));
echo(str("正面旋转角度: [", front_x_angle, ", ", front_y_angle, ", ", front_z_angle, "]"));
echo(str("侧面旋转角度: [", side_x_angle, ", ", side_y_angle, ", ", side_z_angle, "]"));
echo(str("字体: ", font, ", 大小: ", char_size));
echo(str("参照面显示: ", show_reference_faces ? "开启" : "关闭"));
echo(str("面标识模式: ", face_identification == 0 ? "无标识" : (face_identification == 1 ? "面编号" : "面颜色")));

/*
使用说明：

1. 参数设置：
   - 字体设置：选择显示的汉字、字体和大小
   - 旋转与位置：调整字体的旋转角度
   - 模型参数：控制模型物理特性和显示模式
   - 底座设置：自定义底座形状、大小和样式

2. 参照面功能：
   - 开启参照面(show_reference_faces=true)可以更直观地看到字体所在面
   - 面标识模式可选择显示面编号或颜色标识
   - 调整角度时使用参照面，最终打印前关闭(show_reference_faces=false)

3. 旋转角度调整：
   - 侧面字默认Y轴旋转90度，垂直于正面字
   - 尝试30-150度之间的角度组合，寻找最佳交合效果
   - 参照面会随着角度调整而变化，便于定位

4. 打印优化：
   - 华文楷体适合3D打印，笔画连接性好
   - 壁厚建议不小于2.5mm
   - 笔画分离时增大"笔画连接偏移量"
   - 显示模式0用于观察结构，1用于最终打印
   - 底座嵌入深度可调整，增加与模型的结合强度

5. 底座调整：
   - 底座大小比例控制底座与模型的相对大小
   - 嵌入深度控制底座与模型的结合程度
   - 圆形底座适合大多数模型，方形底座适合方正字体
   - 使用X/Y/Z轴位置调整参数可精确定位底座位置
   - 使用X/Y/Z轴旋转角度参数可调整底座的角度
*/ 
